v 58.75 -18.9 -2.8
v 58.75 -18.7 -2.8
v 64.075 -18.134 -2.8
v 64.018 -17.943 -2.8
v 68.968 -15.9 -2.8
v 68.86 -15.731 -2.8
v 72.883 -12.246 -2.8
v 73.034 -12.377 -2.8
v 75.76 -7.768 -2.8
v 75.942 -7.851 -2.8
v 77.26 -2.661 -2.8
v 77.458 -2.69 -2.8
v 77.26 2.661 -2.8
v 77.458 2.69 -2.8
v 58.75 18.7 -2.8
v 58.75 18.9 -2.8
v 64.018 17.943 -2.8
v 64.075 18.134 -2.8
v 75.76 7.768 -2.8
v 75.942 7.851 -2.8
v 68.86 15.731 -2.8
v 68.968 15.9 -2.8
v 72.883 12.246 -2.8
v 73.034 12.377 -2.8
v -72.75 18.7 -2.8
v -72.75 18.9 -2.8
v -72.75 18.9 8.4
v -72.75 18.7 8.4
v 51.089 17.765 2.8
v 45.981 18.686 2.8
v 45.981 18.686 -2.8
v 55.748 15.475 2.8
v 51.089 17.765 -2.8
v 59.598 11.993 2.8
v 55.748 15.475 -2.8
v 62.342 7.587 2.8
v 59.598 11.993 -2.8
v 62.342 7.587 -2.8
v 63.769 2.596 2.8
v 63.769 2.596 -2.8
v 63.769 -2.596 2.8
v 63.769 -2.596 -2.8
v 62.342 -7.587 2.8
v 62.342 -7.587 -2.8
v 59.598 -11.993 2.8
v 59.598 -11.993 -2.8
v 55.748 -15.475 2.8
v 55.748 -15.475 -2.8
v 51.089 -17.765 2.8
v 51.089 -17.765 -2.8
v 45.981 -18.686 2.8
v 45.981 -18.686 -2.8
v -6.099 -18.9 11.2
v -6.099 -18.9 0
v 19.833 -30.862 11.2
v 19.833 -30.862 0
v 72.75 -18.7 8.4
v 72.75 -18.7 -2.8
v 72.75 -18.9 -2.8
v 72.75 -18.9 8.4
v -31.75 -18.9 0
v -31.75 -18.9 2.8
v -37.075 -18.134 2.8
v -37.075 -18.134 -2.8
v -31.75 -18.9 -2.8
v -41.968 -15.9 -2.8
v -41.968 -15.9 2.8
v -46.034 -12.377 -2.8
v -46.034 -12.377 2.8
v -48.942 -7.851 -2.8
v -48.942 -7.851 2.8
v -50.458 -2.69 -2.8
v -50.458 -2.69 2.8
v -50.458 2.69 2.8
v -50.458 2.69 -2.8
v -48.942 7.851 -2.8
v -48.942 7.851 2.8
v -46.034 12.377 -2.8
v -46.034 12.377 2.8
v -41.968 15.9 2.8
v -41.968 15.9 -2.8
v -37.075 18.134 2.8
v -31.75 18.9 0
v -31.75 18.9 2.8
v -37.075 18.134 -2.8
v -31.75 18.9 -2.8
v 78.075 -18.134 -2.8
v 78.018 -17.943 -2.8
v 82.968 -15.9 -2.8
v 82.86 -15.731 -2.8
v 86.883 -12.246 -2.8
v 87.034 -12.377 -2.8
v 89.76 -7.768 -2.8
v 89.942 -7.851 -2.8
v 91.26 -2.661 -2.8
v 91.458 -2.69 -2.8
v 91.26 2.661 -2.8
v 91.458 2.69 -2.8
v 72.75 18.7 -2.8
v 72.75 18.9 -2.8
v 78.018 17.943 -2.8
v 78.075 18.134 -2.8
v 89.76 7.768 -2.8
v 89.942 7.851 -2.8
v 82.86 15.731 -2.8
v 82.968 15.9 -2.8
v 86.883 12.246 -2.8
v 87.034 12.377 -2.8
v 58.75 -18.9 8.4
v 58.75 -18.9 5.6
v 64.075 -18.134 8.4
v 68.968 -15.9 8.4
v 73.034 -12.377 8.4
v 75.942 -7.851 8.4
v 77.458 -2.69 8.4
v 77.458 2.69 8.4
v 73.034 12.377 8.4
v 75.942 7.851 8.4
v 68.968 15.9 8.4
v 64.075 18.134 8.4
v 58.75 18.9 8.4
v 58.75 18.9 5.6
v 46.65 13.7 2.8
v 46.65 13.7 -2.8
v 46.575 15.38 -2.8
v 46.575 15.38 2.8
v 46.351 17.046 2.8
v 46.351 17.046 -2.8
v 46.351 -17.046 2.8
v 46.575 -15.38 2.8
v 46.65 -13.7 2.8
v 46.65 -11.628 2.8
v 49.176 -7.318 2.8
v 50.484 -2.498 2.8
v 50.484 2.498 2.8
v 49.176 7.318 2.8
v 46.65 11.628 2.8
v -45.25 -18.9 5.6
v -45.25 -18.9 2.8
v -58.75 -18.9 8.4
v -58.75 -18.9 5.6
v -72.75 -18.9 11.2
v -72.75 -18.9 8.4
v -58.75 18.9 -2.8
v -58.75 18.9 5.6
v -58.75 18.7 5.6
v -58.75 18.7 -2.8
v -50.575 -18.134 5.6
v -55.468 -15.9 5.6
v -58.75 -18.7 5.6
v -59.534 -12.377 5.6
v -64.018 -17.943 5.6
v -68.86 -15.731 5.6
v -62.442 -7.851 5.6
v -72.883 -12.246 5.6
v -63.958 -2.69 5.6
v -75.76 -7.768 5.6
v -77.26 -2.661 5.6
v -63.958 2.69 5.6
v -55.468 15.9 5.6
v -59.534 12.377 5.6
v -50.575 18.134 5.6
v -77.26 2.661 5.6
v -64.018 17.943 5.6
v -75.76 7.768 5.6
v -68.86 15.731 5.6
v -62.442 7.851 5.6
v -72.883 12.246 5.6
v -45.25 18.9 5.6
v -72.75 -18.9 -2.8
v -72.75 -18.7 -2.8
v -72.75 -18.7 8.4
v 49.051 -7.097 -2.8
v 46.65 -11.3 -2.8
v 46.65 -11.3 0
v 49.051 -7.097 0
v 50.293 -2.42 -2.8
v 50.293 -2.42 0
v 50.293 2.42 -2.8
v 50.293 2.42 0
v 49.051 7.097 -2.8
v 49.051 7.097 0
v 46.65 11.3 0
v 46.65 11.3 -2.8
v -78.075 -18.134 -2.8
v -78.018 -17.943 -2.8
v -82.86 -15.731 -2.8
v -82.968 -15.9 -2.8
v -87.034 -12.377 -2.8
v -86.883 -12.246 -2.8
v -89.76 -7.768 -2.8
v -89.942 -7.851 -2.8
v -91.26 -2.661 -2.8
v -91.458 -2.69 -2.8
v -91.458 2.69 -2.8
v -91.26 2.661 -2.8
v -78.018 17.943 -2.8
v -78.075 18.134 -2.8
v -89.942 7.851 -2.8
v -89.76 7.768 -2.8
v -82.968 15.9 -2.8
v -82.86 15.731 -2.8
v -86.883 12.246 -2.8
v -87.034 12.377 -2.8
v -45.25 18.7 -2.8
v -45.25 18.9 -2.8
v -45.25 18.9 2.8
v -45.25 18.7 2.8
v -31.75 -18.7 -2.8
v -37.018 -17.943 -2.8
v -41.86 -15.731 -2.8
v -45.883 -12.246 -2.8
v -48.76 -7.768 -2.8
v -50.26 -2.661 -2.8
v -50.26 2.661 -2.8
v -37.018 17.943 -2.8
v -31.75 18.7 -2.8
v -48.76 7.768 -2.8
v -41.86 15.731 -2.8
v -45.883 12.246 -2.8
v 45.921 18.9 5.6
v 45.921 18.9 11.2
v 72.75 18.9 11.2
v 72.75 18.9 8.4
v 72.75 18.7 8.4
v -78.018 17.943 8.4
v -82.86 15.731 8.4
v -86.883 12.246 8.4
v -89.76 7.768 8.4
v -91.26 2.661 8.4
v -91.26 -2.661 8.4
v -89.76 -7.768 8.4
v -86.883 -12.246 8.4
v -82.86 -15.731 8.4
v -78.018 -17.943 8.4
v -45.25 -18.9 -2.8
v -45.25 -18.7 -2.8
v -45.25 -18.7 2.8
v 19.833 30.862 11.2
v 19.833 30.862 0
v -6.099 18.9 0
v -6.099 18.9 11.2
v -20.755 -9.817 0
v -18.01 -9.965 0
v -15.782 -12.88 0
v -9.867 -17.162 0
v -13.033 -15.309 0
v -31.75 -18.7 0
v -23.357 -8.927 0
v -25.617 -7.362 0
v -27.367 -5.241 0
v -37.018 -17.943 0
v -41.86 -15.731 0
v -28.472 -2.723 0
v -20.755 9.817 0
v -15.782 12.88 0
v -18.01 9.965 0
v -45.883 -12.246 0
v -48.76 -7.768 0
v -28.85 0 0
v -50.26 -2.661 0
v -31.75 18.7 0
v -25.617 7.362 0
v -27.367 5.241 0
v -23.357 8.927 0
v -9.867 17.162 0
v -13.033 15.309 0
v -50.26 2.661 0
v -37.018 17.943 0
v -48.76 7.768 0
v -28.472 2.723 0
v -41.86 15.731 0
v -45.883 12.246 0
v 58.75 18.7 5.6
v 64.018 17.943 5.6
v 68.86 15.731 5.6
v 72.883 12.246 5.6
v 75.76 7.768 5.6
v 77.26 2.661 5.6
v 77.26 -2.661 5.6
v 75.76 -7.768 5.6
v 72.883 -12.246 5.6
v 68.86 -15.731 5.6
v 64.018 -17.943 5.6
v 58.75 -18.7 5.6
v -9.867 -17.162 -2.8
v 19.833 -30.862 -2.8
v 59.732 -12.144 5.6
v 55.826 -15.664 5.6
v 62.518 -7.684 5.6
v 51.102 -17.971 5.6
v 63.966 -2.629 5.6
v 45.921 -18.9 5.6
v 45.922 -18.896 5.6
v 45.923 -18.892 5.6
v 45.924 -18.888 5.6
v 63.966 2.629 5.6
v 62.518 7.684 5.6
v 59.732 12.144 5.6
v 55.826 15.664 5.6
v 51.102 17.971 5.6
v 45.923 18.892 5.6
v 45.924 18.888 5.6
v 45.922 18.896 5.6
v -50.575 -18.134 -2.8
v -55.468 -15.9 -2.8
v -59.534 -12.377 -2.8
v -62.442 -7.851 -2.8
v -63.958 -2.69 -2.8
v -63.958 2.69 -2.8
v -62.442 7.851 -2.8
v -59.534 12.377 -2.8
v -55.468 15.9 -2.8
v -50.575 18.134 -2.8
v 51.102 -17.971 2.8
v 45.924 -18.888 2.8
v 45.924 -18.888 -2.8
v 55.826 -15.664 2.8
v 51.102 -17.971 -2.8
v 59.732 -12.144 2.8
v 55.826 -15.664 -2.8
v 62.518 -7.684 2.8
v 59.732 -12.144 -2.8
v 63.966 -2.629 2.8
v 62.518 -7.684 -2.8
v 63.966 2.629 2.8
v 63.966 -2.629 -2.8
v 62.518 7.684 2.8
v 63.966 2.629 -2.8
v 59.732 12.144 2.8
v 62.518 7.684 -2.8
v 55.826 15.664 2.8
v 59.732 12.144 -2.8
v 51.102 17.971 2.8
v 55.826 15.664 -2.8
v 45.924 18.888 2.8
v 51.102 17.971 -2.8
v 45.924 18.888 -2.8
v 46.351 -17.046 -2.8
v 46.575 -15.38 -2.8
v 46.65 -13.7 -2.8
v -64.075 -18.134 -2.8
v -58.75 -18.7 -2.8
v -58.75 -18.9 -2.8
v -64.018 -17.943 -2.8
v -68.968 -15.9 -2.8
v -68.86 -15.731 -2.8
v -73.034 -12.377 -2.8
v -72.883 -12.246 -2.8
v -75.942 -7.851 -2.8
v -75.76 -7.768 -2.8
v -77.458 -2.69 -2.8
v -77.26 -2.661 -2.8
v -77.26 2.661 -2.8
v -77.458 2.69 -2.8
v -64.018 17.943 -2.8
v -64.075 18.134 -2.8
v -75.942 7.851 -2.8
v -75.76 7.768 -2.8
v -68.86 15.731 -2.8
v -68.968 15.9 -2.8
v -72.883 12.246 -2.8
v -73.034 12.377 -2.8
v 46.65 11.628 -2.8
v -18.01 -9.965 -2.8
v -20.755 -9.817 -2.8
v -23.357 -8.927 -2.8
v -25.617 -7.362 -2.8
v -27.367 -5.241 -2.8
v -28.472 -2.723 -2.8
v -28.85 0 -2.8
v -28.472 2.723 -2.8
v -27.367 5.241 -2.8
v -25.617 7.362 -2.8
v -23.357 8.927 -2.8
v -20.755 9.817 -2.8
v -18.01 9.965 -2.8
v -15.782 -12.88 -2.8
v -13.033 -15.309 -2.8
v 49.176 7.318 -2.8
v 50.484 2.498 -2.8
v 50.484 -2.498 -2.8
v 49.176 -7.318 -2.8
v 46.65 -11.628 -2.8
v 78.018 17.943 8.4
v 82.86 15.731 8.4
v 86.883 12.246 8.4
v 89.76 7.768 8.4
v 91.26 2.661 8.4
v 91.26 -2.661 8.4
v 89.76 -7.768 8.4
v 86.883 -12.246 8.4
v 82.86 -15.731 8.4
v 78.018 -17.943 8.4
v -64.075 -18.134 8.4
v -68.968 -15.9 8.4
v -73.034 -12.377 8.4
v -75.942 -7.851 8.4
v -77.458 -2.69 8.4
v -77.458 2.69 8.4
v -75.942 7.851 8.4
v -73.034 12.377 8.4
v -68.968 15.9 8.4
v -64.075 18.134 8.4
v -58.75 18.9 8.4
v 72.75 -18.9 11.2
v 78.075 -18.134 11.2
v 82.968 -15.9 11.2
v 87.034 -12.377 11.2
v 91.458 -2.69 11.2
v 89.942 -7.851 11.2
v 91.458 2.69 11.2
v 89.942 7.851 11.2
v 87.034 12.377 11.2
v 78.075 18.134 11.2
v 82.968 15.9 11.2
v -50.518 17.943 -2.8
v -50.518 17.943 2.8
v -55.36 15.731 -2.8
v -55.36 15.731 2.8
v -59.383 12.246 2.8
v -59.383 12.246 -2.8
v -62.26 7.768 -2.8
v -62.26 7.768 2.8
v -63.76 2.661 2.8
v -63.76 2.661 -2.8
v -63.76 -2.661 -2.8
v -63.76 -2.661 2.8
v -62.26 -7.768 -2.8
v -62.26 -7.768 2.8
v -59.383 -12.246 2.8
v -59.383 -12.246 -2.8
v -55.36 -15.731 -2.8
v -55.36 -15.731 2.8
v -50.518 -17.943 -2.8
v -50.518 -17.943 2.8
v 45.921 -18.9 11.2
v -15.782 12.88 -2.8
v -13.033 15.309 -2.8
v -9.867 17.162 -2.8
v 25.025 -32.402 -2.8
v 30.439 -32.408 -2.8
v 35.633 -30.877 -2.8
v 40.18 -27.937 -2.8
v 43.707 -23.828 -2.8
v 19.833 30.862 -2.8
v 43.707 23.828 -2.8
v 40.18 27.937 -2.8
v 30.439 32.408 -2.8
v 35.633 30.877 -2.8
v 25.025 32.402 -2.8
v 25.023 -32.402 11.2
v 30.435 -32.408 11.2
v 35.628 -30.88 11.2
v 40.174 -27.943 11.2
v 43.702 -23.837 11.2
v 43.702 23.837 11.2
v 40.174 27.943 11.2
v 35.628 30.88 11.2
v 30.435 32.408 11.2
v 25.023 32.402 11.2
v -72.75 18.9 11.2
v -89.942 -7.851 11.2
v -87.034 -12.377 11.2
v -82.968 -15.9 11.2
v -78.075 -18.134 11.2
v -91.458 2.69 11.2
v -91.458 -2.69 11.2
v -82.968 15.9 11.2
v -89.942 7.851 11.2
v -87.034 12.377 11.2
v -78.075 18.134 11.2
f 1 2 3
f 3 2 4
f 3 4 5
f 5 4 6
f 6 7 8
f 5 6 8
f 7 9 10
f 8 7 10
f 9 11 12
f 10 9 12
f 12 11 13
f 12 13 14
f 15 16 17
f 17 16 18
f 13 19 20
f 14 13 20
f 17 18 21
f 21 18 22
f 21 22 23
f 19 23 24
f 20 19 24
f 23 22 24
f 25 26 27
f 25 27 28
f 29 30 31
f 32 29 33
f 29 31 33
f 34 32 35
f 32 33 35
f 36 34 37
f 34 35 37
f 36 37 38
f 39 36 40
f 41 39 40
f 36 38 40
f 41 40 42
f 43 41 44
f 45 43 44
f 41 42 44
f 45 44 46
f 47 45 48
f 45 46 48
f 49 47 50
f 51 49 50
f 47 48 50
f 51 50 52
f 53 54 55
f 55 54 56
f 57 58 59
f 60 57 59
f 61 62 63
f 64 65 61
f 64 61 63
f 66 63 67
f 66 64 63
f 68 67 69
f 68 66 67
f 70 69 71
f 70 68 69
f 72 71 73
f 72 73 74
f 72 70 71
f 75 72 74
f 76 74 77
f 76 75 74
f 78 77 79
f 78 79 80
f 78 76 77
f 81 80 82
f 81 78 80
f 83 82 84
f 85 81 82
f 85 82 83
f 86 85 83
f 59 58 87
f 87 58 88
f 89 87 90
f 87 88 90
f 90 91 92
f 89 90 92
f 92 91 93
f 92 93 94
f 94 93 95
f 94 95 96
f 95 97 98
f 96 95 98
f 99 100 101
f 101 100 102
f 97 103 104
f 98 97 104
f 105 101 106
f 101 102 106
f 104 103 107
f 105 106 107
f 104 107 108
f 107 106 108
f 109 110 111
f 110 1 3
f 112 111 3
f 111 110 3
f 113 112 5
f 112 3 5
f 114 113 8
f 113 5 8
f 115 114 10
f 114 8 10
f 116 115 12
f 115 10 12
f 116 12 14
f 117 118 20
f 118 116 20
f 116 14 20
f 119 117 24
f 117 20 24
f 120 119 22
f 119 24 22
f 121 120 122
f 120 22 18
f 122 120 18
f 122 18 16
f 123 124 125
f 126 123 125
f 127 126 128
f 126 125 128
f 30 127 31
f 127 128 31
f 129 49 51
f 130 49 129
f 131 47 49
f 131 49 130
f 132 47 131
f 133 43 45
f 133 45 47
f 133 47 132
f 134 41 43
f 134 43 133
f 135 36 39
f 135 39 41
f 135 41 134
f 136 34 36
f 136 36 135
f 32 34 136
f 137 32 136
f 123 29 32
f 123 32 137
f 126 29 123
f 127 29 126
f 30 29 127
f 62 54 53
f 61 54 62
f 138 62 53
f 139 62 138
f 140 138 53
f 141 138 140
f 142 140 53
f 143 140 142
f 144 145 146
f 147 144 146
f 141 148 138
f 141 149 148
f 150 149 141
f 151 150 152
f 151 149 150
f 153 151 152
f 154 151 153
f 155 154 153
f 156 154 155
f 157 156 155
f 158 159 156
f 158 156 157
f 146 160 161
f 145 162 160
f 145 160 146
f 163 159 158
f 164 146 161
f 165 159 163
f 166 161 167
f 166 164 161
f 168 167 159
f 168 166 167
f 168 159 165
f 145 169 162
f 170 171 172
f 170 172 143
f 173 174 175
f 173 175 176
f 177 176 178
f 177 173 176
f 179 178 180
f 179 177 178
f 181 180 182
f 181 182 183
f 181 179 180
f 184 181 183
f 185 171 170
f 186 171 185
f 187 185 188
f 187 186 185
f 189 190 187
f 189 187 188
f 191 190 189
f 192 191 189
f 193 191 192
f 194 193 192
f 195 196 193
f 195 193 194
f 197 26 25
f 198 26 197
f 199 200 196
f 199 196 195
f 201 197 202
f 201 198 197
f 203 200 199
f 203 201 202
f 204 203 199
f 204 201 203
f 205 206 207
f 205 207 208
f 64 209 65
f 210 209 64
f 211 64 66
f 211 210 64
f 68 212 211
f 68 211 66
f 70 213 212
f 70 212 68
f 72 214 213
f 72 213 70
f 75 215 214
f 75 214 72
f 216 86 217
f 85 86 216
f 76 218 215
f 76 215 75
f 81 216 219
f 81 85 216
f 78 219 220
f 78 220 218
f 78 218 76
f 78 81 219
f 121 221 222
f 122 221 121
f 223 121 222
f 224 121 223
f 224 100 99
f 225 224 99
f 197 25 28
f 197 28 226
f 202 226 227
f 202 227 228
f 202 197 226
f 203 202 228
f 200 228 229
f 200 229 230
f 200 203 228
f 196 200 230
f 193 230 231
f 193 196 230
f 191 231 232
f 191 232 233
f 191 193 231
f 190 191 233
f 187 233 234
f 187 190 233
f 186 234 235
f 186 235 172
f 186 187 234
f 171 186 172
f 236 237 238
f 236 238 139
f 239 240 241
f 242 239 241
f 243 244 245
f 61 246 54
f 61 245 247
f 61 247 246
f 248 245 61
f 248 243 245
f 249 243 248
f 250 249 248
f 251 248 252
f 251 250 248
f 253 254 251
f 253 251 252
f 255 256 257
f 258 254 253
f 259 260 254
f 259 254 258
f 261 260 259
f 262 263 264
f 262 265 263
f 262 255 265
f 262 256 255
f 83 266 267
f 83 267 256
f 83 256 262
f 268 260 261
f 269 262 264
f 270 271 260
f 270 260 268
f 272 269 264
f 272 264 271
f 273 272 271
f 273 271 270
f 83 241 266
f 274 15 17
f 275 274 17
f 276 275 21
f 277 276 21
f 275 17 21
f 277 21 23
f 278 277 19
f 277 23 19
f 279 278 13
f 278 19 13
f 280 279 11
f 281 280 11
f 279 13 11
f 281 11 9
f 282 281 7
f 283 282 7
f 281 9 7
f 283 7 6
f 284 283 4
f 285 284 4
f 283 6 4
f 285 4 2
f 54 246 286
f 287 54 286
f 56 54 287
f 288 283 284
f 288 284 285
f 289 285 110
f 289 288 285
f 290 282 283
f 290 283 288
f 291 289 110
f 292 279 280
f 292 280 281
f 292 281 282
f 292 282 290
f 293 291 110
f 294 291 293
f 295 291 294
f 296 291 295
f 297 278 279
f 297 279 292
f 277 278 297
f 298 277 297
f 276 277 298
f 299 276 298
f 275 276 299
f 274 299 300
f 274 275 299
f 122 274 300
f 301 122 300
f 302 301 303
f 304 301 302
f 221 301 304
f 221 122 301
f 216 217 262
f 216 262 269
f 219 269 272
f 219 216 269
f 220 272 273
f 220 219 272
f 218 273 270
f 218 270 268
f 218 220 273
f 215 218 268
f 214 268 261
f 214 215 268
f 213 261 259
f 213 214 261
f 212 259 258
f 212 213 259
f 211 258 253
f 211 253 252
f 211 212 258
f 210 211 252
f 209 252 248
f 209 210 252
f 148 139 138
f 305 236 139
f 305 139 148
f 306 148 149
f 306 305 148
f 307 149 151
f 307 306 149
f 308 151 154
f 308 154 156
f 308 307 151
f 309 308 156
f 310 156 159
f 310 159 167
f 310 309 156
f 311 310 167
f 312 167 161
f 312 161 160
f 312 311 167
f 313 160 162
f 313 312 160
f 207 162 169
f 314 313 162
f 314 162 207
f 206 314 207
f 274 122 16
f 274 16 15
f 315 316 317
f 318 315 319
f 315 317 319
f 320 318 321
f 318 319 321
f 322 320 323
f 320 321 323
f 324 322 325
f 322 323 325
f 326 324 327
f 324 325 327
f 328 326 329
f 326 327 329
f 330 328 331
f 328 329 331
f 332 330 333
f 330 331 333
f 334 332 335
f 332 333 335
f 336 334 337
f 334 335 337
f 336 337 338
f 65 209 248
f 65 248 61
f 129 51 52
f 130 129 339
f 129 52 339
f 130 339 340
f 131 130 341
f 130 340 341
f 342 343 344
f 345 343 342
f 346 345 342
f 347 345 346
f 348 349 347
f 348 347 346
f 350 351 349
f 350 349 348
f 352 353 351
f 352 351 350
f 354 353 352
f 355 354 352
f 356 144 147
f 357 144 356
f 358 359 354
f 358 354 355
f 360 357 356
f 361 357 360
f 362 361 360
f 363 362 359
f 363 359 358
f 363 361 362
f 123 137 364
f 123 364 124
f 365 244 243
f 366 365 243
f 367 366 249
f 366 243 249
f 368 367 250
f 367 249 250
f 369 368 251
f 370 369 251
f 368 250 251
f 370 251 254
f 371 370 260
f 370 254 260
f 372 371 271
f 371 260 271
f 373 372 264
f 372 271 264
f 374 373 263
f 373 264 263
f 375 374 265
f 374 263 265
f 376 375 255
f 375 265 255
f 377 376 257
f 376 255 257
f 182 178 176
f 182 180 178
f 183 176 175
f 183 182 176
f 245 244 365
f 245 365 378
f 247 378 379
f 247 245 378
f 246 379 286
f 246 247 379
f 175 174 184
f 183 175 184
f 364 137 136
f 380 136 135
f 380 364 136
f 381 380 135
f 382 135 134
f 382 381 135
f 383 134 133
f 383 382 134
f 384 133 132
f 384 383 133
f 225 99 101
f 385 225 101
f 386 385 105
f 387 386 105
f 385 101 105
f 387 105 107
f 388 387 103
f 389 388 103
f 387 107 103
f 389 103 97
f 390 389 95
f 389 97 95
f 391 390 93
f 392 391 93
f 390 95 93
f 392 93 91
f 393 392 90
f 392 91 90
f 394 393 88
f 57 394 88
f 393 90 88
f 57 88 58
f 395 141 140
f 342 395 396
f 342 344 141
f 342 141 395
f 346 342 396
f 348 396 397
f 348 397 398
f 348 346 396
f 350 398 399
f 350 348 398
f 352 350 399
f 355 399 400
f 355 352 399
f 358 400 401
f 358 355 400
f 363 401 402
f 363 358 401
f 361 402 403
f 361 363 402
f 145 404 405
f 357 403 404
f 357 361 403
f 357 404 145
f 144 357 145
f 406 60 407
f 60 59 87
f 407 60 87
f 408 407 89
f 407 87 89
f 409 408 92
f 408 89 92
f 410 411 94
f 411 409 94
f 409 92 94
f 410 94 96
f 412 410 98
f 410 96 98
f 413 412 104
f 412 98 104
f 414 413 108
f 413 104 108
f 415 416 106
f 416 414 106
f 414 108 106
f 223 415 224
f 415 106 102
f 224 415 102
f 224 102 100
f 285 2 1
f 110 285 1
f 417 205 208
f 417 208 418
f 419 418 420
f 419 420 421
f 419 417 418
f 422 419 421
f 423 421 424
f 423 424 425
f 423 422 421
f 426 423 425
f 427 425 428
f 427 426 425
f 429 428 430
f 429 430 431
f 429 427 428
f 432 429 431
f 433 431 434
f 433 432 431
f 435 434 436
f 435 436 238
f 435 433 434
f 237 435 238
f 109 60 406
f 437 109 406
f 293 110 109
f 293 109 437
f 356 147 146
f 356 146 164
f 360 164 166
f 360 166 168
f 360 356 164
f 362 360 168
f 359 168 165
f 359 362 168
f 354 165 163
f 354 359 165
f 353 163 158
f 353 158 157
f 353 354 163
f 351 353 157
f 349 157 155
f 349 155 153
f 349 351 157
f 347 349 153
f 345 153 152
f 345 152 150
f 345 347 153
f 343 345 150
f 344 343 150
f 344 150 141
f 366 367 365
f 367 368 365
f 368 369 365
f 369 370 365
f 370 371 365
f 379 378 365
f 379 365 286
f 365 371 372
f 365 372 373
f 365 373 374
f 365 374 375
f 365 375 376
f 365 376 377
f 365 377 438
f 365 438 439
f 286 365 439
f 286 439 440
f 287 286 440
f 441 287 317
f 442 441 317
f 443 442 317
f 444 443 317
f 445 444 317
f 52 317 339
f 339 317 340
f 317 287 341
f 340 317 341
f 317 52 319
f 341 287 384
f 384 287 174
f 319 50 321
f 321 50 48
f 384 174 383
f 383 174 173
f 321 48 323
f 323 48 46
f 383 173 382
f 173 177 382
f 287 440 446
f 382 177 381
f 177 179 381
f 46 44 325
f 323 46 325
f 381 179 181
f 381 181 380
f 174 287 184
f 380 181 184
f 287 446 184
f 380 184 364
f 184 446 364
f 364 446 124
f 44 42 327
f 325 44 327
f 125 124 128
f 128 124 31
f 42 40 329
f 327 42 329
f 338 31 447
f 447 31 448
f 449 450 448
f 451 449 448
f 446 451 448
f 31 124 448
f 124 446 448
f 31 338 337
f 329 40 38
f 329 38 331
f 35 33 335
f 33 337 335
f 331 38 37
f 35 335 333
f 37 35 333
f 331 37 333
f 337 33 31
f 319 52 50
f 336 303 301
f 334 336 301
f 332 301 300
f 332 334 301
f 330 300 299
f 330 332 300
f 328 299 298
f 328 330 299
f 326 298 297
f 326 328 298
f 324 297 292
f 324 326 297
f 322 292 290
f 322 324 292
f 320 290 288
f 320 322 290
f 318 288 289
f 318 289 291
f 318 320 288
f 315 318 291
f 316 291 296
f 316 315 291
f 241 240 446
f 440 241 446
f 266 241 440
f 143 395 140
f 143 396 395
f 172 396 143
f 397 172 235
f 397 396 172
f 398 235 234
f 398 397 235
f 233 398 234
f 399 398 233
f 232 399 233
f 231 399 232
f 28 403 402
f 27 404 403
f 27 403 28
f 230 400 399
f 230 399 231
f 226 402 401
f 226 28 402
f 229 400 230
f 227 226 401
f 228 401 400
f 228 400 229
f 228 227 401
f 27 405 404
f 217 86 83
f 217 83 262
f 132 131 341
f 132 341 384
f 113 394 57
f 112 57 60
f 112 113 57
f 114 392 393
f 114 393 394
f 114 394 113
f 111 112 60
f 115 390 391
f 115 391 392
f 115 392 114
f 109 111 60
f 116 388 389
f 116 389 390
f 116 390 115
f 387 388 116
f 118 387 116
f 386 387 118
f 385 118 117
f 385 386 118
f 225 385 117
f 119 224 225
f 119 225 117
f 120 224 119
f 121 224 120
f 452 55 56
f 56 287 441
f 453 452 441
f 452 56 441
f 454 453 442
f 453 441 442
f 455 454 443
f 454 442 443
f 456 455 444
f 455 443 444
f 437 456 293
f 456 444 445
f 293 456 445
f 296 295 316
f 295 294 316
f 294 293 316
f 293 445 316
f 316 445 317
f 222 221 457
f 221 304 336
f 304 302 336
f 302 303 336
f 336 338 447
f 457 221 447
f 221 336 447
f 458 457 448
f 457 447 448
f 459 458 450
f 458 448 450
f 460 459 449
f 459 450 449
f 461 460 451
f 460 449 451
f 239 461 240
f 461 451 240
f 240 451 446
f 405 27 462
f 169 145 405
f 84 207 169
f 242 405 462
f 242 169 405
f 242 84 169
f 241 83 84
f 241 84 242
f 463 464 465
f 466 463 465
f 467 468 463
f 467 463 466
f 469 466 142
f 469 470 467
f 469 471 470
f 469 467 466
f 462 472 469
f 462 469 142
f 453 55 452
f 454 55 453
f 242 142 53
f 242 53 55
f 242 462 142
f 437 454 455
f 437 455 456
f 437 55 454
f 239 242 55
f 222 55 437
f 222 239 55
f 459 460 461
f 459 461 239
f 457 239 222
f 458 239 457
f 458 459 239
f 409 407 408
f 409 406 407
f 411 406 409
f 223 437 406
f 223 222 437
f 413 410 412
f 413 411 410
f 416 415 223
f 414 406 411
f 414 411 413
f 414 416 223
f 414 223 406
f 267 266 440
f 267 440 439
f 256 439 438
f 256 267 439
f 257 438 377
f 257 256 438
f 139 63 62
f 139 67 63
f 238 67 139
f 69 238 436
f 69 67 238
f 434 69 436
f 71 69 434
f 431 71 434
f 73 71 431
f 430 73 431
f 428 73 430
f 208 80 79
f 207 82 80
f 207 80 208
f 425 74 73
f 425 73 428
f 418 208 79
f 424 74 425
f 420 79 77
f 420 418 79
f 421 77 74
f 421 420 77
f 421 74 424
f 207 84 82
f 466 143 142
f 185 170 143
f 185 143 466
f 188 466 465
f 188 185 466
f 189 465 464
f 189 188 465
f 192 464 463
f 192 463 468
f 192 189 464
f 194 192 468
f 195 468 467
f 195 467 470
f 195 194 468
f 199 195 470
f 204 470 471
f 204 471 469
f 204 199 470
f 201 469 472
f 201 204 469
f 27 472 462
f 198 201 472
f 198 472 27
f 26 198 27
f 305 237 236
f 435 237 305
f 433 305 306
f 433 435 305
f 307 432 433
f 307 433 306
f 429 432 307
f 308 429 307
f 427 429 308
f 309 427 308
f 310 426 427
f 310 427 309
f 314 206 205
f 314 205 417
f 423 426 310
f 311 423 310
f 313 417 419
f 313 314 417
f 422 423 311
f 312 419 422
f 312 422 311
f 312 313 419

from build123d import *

# Parameters (mm, degrees)
BOSS_EXTRUDE1_DEPTH  = 2.8
BOSS_EXTRUDE5_DEPTH  = 2.8
BOSS_EXTRUDE2_DEPTH  = 2.8
BOSS_EXTRUDE3_DEPTH  = 2.8
BOSS_EXTRUDE4_DEPTH  = 2.8
BOSS_EXTRUDE6_DEPTH  = 11.2
BOSS_EXTRUDE7_START  = -2.8
BOSS_EXTRUDE7_DEPTH  = 2.8
BOSS_EXTRUDE8_START  = 11.2
BOSS_EXTRUDE8_DEPTH  = 11.2
BOSS_EXTRUDE9_START  = 8.4
BOSS_EXTRUDE9_DEPTH  = 8.4
BOSS_EXTRUDE10_START = 5.6
BOSS_EXTRUDE10_DEPTH = 5.6
BOSS_EXTRUDE11_START = 2.8
BOSS_EXTRUDE11_DEPTH = 2.8


with BuildPart() as part:
    # Sketch1 → Boss-Extrude1 (new body)
    with BuildSketch(Plane.XY):
        with BuildLine():
            Line((-31.75, 18.9), (31.75, 18.9))
            ThreePointArc((31.75, 18.9), (50.65, 0), (31.75, -18.9))
            Line((31.75, -18.9), (-31.75, -18.9))
            ThreePointArc((-31.75, -18.9), (-50.65, 0), (-31.75, 18.9))
        make_face()
    extrude(amount=BOSS_EXTRUDE1_DEPTH)

    # Sketch5 → Boss-Extrude5 (add)
    with BuildSketch(Plane(origin=(0, 0, 0), x_dir=(-1, 0, 0), z_dir=(0, 0, -1))):
        with BuildLine():
            Line((-46.65, -13.7), (-46.65, 13.7))
            ThreePointArc((-46.65, 13.7), (-37.937921505, 29.619053219), (-19.833465037, 30.862123242))
            Line((-19.833465037, 30.862123242), (9.866534963, 17.162123242))
            ThreePointArc((9.866534963, 17.162123242), (20.85, 0), (9.866534963, -17.162123242))
            Line((9.866534963, -17.162123242), (-19.833465037, -30.862123242))
            ThreePointArc((-19.833465037, -30.862123242), (-37.937921505, -29.619053219), (-46.65, -13.7))
        make_face()
    extrude(amount=BOSS_EXTRUDE5_DEPTH)

    # Sketch2 → Boss-Extrude2 (add)
    with BuildSketch(Plane.XY.offset(2.8)):
        with BuildLine():
            Line((-45.25, 18.9), (45.25, 18.9))
            ThreePointArc((45.25, 18.9), (64.15, 0), (45.25, -18.9))
            Line((45.25, -18.9), (-45.25, -18.9))
            ThreePointArc((-45.25, -18.9), (-64.15, 0), (-45.25, 18.9))
        make_face()
    extrude(amount=BOSS_EXTRUDE2_DEPTH)

    # Sketch3 → Boss-Extrude3 (add)
    with BuildSketch(Plane.XY.offset(5.6)):
        with BuildLine():
            Line((-58.75, 18.9), (58.75, 18.9))
            ThreePointArc((58.75, 18.9), (77.65, 0), (58.75, -18.9))
            Line((58.75, -18.9), (-58.75, -18.9))
            ThreePointArc((-58.75, -18.9), (-77.65, 0), (-58.75, 18.9))
        make_face()
    extrude(amount=BOSS_EXTRUDE3_DEPTH)

    # Sketch4 → Boss-Extrude4 (add)
    with BuildSketch(Plane.XY.offset(8.4)):
        with BuildLine():
            Line((-72.75, 18.9), (72.75, 18.9))
            ThreePointArc((72.75, 18.9), (91.65, 0), (72.75, -18.9))
            Line((72.75, -18.9), (-72.75, -18.9))
            ThreePointArc((-72.75, -18.9), (-91.65, 0), (-72.75, 18.9))
        make_face()
    extrude(amount=BOSS_EXTRUDE4_DEPTH)

    # Sketch7 → Boss-Extrude6 (add)
    with BuildSketch(Plane.XY):
        with BuildLine():
            Line((31.75, -18.9), (-6.099021116, -18.9))
            Line((-6.099021116, -18.9), (19.833465037, -30.862123242))
            ThreePointArc((19.833465037, -30.862123242), (37.937921505, -29.619053219), (46.65, -13.7))
            Line((46.65, -13.7), (46.65, -11.627553483))
            ThreePointArc((46.65, -11.627553483), (40.040031338, -16.984857386), (31.75, -18.9))
        make_face()
        with BuildLine():
            Line((46.65, 11.627553483), (46.65, 13.7))
            ThreePointArc((46.65, 13.7), (37.937921505, 29.619053219), (19.833465037, 30.862123242))
            Line((19.833465037, 30.862123242), (-6.099021116, 18.9))
            Line((-6.099021116, 18.9), (31.75, 18.9))
            ThreePointArc((31.75, 18.9), (40.040031338, 16.984857386), (46.65, 11.627553483))
        make_face()
    extrude(amount=BOSS_EXTRUDE6_DEPTH)

    # Sketch10 → Boss-Extrude7 (add)
    with BuildSketch(Plane(origin=(0, 0, -2.8), x_dir=(-1, 0, 0), z_dir=(0, 0, -1)).offset(BOSS_EXTRUDE7_START)):
        with BuildLine():
            ThreePointArc((18.009763314, -9.964637591), (28.85, 0), (18.009763314, 9.964637591))
            ThreePointArc((18.009763314, 9.964637591), (20.85, 0), (18.009763314, -9.964637591))
        make_face()
    extrude(amount=BOSS_EXTRUDE7_DEPTH)

    # Sketch11 → Boss-Extrude8 (add)
    with BuildSketch(Plane(origin=(0, 0, 8.4), x_dir=(-1, 0, 0), z_dir=(0, 0, -1)).offset(BOSS_EXTRUDE8_START)):
        with BuildLine():
            Line((-72.75, -18.7), (-72.75, -18.9))
            ThreePointArc((-72.75, -18.9), (-91.65, 0), (-72.75, 18.9))
            Line((-72.75, 18.9), (-72.75, 18.7))
            ThreePointArc((-72.75, 18.7), (-91.45, 0), (-72.75, -18.7))
        make_face()
        with BuildLine():
            Line((72.75, -18.7), (72.75, -18.9))
            ThreePointArc((72.75, -18.9), (91.65, 0), (72.75, 18.9))
            Line((72.75, 18.9), (72.75, 18.7))
            ThreePointArc((72.75, 18.7), (91.45, 0), (72.75, -18.7))
        make_face()
    extrude(amount=-BOSS_EXTRUDE8_DEPTH)

    # Sketch12 → Boss-Extrude9 (add)
    with BuildSketch(Plane(origin=(0, 0, 5.6), x_dir=(-1, 0, 0), z_dir=(0, 0, -1)).offset(BOSS_EXTRUDE9_START)):
        with BuildLine():
            Line((-58.75, 18.9), (-58.75, 18.7))
            ThreePointArc((-58.75, 18.7), (-77.45, 0), (-58.75, -18.7))
            Line((-58.75, -18.7), (-58.75, -18.9))
            ThreePointArc((-58.75, -18.9), (-77.65, 0), (-58.75, 18.9))
        make_face()
        with BuildLine():
            Line((58.75, 18.9), (58.75, 18.7))
            ThreePointArc((58.75, 18.7), (77.45, 0), (58.75, -18.7))
            Line((58.75, -18.7), (58.75, -18.9))
            ThreePointArc((58.75, -18.9), (77.65, 0), (58.75, 18.9))
        make_face()
    extrude(amount=-BOSS_EXTRUDE9_DEPTH)

    # Sketch13 → Boss-Extrude10 (add)
    with BuildSketch(Plane(origin=(0, 0, 2.8), x_dir=(-1, 0, 0), z_dir=(0, 0, -1)).offset(BOSS_EXTRUDE10_START)):
        with BuildLine():
            Line((-45.924016822, 18.887977693), (-45.916884369, 18.688104913))
            ThreePointArc((-45.916884369, 18.688104913), (-63.95, 0), (-45.916884369, -18.688104913))
            Line((-45.916884369, -18.688104913), (-45.924016822, -18.887977693))
            ThreePointArc((-45.924016822, -18.887977693), (-64.15, 0), (-45.924016822, 18.887977693))
        make_face()
        with BuildLine():
            Line((45.25, 18.9), (45.25, 18.7))
            ThreePointArc((45.25, 18.7), (63.95, 0), (45.25, -18.7))
            Line((45.25, -18.7), (45.25, -18.9))
            ThreePointArc((45.25, -18.9), (64.15, 0), (45.25, 18.9))
        make_face()
    extrude(amount=-BOSS_EXTRUDE10_DEPTH)

    # Sketch14 → Boss-Extrude11 (add)
    with BuildSketch(Plane(origin=(0, 0, 0), x_dir=(-1, 0, 0), z_dir=(0, 0, -1)).offset(BOSS_EXTRUDE11_START)):
        with BuildLine():
            Line((-46.65, -11.627553483), (-46.492328042, -11.504510589))
            ThreePointArc((-46.492328042, -11.504510589), (-50.45, 0), (-46.492328042, 11.504510589))
            Line((-46.492328042, 11.504510589), (-46.65, 11.627553483))
            ThreePointArc((-46.65, 11.627553483), (-50.65, 0), (-46.65, -11.627553483))
        make_face()
        with BuildLine():
            Line((31.75, 18.9), (31.75, 18.7))
            ThreePointArc((31.75, 18.7), (50.45, 0), (31.75, -18.7))
            Line((31.75, -18.7), (31.75, -18.9))
            ThreePointArc((31.75, -18.9), (50.65, 0), (31.75, 18.9))
        make_face()
    extrude(amount=-BOSS_EXTRUDE11_DEPTH)


solid = part.part
